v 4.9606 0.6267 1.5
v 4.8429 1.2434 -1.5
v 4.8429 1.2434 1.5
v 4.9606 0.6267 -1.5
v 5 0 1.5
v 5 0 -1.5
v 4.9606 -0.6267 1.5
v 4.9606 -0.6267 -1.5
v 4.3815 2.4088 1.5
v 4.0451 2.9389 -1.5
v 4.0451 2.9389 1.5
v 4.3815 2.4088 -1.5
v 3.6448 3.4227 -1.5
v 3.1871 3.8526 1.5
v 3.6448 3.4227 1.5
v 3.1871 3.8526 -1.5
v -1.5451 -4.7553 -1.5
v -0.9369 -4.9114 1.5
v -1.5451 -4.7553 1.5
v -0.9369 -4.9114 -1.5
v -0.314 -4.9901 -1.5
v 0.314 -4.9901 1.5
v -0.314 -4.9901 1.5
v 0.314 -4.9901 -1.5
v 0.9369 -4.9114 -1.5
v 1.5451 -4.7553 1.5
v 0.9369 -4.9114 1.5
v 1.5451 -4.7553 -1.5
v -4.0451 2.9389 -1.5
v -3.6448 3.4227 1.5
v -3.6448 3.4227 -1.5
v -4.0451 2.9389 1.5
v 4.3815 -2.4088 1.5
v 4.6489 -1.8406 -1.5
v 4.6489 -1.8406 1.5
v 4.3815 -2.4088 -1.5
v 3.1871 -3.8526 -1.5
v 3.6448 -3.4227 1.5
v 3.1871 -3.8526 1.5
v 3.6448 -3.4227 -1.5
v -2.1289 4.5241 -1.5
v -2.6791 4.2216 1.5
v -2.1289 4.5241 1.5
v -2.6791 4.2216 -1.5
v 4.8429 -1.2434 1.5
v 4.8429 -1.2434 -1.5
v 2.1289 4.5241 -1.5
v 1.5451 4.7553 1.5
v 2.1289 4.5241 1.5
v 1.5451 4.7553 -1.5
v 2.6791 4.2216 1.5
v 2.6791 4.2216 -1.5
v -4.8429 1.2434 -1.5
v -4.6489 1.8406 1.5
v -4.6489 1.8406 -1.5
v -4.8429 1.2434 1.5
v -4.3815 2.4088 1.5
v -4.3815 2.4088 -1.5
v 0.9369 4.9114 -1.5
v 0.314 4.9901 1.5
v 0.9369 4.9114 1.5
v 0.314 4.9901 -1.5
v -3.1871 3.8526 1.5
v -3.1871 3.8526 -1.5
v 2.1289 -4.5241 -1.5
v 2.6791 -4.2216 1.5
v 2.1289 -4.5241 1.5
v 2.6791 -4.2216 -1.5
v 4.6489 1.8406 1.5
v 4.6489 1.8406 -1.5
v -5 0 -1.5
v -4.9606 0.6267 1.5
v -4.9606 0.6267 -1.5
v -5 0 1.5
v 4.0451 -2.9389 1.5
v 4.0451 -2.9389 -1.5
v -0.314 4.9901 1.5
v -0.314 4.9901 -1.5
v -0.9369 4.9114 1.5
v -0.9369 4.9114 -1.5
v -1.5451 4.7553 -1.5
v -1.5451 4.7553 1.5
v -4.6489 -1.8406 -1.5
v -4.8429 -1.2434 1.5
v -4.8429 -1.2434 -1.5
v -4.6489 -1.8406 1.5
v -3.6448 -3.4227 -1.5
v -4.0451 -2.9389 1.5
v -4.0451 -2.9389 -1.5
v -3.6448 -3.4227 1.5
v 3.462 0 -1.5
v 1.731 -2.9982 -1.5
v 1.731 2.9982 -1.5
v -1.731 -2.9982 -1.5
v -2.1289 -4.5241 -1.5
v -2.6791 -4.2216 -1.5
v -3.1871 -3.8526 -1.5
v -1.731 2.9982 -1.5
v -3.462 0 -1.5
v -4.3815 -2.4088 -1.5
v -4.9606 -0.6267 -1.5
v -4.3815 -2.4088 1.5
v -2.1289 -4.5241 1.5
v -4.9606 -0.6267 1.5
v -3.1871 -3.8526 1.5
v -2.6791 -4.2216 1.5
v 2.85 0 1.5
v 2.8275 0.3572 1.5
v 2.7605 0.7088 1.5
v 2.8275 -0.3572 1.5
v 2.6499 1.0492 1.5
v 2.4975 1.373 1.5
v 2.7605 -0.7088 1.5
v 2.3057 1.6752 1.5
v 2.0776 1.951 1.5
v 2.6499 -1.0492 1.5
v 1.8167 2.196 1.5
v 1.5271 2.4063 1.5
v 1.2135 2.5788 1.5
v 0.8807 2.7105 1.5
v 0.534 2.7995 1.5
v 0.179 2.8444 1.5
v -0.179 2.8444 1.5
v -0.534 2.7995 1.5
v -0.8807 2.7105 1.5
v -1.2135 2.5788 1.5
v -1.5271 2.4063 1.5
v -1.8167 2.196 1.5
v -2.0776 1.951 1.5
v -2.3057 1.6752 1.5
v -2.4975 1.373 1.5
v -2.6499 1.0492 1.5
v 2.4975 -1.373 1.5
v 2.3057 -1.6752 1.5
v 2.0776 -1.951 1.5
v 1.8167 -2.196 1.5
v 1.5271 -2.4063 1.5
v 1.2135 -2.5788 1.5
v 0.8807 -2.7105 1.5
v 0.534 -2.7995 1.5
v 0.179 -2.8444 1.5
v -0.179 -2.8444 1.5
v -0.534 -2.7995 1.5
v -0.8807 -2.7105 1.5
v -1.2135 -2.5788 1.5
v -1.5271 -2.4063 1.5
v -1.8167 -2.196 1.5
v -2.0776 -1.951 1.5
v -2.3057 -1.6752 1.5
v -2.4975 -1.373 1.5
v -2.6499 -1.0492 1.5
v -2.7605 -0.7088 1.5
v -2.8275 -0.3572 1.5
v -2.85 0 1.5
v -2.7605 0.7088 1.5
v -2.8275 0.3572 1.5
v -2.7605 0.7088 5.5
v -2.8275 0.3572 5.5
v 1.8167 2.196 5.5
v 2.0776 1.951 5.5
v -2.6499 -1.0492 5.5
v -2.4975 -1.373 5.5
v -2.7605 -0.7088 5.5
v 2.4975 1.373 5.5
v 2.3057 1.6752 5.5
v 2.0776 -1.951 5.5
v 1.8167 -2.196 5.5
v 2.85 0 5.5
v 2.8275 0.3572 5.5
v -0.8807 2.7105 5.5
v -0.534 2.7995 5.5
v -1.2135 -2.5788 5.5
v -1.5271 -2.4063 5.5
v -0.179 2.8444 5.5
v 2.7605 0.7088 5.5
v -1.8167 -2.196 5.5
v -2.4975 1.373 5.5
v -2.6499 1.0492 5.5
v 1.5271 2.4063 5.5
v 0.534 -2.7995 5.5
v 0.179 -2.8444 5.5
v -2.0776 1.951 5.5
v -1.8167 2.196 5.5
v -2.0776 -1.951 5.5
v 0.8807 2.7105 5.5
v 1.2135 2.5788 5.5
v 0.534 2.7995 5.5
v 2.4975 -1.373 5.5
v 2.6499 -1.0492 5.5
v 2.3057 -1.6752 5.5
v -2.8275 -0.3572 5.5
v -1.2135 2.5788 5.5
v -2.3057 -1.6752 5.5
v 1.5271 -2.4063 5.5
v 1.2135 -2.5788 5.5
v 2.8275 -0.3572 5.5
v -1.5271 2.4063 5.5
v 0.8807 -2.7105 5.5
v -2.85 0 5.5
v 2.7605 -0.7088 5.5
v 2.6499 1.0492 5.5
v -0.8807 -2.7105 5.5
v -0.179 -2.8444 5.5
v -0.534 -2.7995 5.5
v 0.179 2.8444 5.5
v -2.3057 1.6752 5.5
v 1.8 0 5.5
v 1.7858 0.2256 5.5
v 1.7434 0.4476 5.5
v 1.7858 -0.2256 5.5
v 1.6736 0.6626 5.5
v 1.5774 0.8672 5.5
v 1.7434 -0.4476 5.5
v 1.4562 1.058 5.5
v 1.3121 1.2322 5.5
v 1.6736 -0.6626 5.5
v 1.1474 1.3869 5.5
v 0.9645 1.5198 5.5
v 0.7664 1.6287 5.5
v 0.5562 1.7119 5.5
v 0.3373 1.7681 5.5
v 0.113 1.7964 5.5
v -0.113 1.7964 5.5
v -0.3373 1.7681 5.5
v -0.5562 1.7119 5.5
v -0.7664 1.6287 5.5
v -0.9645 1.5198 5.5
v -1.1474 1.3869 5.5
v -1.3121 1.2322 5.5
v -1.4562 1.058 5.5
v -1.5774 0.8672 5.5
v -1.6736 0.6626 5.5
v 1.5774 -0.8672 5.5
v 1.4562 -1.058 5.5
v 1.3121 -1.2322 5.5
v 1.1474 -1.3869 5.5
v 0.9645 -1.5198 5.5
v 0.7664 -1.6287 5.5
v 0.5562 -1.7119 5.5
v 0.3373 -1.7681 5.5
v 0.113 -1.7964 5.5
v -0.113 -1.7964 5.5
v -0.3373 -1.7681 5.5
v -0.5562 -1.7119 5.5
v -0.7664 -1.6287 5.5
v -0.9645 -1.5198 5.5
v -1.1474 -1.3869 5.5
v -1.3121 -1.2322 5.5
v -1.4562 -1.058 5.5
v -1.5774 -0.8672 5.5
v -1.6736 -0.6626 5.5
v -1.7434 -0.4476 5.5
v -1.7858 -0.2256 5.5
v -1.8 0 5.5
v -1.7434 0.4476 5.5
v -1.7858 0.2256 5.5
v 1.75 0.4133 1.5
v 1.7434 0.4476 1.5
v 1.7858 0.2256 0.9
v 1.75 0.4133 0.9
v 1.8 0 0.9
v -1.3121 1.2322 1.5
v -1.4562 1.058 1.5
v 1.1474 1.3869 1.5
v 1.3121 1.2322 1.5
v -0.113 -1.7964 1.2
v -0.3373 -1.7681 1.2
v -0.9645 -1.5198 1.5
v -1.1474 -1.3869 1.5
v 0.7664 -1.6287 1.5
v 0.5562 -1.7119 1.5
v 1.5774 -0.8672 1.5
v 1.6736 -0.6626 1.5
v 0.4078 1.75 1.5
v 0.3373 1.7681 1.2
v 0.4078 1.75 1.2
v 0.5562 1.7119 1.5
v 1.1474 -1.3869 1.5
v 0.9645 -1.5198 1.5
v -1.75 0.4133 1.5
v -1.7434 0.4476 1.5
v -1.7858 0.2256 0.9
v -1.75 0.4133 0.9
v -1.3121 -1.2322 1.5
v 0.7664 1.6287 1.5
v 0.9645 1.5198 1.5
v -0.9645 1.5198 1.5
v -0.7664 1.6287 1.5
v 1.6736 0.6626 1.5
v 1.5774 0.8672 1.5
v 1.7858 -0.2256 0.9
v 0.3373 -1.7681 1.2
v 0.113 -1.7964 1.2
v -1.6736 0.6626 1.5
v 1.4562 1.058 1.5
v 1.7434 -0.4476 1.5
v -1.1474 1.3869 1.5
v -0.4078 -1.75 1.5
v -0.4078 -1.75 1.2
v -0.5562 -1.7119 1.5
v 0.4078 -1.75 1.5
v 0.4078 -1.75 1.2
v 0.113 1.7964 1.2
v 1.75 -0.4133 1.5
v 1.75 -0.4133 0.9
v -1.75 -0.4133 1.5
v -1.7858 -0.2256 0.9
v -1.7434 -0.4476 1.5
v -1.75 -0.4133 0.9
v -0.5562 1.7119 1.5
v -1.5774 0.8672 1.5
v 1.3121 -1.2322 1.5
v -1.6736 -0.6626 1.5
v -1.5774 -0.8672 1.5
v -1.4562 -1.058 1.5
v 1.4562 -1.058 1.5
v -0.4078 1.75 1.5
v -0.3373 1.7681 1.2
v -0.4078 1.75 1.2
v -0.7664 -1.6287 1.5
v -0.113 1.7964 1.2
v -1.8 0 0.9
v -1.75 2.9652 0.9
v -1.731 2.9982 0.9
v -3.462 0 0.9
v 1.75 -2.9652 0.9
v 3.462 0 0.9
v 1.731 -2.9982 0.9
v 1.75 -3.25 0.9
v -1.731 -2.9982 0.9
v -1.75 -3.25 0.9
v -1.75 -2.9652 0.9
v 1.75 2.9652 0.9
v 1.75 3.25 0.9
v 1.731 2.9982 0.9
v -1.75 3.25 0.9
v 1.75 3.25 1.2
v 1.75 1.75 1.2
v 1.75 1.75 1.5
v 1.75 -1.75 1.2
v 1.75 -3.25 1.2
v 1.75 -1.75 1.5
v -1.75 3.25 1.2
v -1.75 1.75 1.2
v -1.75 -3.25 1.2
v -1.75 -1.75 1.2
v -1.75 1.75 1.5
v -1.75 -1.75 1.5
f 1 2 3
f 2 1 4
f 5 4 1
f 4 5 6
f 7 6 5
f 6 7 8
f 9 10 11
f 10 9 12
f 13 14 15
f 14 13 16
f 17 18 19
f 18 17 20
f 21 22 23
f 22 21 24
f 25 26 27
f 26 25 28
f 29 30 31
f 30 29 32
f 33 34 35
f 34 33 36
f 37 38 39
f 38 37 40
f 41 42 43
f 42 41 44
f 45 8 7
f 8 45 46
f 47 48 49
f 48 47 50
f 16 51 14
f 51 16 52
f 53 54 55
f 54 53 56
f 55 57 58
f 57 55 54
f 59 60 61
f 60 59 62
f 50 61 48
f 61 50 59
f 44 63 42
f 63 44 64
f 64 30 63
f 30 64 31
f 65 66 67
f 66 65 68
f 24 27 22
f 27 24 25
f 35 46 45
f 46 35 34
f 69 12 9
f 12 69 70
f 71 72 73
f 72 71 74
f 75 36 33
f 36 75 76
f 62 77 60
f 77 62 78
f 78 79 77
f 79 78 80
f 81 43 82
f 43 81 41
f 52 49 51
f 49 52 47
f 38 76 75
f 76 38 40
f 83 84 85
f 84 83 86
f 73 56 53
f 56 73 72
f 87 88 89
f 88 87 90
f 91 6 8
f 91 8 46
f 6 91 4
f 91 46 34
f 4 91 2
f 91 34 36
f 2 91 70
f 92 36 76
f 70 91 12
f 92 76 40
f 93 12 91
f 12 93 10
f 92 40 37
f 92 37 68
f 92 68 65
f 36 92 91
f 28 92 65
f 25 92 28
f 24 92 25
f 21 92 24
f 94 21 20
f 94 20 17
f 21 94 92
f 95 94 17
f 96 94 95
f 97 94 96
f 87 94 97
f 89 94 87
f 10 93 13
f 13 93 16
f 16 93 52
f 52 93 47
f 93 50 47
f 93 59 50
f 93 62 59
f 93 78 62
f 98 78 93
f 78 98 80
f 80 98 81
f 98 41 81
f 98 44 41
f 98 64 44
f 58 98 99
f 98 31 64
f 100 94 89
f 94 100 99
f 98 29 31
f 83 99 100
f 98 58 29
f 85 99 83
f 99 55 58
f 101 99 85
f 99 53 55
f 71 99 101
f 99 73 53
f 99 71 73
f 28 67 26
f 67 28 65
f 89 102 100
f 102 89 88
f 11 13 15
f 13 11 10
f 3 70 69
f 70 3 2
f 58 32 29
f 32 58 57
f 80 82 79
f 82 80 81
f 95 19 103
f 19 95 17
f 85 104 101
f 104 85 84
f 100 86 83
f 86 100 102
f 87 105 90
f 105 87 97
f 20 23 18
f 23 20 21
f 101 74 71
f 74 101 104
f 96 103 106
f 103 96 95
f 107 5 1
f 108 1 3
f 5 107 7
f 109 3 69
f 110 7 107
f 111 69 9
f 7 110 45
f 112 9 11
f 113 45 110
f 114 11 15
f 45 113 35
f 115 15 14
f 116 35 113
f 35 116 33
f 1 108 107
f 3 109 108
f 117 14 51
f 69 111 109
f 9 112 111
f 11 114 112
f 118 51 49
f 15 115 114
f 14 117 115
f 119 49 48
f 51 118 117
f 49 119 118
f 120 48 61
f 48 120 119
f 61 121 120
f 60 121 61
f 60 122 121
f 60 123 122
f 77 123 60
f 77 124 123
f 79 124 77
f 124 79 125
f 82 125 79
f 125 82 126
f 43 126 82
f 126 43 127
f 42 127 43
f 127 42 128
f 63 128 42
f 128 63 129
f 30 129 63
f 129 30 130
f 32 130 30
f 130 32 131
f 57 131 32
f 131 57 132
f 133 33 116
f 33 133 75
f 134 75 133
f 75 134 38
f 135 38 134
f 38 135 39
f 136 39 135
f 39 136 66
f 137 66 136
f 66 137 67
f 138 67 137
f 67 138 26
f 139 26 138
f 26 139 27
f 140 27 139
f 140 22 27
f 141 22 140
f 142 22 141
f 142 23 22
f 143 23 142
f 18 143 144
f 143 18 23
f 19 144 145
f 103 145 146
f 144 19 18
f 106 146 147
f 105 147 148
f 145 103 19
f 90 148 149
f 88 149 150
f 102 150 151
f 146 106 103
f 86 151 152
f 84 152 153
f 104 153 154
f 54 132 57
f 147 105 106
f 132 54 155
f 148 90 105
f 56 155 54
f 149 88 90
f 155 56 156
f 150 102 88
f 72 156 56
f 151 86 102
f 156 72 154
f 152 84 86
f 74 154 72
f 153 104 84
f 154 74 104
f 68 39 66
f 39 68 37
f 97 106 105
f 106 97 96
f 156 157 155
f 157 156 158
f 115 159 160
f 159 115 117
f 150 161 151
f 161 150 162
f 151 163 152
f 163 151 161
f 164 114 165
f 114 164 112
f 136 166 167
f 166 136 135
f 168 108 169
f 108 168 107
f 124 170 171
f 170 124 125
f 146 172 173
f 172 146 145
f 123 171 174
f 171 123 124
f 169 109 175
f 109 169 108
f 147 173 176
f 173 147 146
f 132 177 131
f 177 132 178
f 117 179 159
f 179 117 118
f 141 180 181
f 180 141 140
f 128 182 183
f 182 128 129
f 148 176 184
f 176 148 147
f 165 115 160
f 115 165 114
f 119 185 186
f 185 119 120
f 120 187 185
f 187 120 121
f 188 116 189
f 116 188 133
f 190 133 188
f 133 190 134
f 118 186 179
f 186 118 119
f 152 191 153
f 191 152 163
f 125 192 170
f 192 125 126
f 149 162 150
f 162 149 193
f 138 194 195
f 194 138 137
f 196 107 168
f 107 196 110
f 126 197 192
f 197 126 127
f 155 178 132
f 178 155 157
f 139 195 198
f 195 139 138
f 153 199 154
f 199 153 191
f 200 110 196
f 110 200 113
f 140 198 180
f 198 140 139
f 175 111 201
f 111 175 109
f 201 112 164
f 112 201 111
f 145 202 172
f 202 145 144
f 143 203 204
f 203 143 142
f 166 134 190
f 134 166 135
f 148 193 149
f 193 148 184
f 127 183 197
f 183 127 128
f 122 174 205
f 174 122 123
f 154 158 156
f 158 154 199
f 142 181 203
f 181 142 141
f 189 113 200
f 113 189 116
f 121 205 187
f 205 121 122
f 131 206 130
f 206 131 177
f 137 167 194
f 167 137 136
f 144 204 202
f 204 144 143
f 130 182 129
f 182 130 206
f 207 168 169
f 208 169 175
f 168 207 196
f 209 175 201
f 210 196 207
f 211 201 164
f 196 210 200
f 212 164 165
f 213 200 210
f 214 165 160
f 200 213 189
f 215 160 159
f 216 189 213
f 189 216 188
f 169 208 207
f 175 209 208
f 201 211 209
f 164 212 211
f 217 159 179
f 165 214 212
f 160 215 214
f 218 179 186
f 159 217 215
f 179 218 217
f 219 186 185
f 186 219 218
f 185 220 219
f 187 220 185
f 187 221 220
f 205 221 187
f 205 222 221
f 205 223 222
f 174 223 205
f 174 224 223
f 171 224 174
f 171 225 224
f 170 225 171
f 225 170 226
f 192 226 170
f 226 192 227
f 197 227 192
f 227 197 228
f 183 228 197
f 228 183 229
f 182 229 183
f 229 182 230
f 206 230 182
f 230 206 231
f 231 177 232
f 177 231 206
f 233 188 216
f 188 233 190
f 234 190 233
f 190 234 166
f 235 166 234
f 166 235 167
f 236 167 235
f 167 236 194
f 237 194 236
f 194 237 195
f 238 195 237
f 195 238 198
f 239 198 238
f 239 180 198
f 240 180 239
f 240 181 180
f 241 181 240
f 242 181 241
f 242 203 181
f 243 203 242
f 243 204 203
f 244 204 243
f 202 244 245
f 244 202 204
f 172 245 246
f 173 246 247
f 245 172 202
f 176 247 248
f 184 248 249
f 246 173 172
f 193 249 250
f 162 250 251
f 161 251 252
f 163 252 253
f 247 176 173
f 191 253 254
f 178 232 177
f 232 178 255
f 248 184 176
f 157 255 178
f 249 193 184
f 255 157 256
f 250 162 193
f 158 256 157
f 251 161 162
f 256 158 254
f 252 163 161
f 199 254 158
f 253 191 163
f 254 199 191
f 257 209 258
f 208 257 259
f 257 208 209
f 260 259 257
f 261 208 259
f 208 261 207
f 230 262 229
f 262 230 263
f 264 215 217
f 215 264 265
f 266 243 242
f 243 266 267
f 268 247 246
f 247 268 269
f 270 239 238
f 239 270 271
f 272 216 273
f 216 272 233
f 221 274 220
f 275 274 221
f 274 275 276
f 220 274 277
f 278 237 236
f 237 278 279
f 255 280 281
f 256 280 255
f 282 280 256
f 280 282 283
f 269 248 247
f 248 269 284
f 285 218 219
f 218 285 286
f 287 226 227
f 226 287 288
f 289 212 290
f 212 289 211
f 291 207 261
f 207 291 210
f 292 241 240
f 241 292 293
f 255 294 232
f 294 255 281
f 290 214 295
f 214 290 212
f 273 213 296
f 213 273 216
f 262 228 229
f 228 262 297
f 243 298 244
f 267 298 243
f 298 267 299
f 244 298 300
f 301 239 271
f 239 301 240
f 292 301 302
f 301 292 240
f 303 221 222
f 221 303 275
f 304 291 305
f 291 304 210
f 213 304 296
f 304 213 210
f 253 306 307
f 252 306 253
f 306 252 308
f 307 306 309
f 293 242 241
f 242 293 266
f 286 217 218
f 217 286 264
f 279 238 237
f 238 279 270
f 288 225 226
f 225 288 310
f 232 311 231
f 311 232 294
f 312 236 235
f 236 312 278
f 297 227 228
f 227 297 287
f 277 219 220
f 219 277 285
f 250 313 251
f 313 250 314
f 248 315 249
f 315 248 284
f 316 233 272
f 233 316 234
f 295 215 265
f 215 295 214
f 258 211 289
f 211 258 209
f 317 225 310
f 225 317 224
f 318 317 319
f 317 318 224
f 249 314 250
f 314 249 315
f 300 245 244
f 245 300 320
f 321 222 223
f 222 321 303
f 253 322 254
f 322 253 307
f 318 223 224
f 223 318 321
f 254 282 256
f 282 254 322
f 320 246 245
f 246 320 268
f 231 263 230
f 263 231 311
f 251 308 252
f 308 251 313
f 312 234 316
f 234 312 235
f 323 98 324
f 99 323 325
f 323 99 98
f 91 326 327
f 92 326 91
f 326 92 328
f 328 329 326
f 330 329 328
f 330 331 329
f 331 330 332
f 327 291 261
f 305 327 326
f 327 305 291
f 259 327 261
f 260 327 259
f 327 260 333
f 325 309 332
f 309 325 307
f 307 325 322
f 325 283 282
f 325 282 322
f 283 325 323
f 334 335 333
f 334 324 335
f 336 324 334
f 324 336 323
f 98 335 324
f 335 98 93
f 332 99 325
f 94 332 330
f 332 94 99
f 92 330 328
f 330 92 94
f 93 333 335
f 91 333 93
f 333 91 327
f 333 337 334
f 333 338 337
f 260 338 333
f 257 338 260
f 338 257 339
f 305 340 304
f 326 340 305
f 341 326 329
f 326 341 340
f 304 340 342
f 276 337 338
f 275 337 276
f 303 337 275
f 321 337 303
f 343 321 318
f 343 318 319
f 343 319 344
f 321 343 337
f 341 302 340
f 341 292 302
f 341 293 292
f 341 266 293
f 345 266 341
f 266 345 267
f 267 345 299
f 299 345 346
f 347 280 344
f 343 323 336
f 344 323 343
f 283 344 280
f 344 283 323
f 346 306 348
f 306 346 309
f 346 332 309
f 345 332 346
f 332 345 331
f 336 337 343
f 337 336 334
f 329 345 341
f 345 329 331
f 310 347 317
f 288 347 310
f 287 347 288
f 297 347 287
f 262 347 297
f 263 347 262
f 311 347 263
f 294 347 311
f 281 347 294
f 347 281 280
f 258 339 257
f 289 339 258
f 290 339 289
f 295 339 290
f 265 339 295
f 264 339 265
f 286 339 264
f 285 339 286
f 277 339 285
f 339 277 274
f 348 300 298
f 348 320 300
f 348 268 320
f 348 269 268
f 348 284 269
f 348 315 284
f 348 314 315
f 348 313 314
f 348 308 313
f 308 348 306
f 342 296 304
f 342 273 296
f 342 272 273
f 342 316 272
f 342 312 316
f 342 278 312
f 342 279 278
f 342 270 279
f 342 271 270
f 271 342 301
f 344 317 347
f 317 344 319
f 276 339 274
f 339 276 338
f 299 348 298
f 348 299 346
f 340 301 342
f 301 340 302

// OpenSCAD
$fn = 50;


difference() {
	union() {
		translate(v = [0, 0, -1.5000000000]) {
			rotate(a = [0, 0, 0]) {
				cylinder(h = 3, r = 5.0000000000);
			}
		}
		translate(v = [0, 0, -1.5000000000]) {
			rotate(a = [0, 0, 0]) {
				cylinder(h = 7, r = 2.8500000000);
			}
		}
	}
	union() {
		translate(v = [0, 0, -125.0000000000]) {
			rotate(a = [0, 0, 0]) {
				cylinder(h = 250, r = 1.8000000000);
			}
		}
		translate(v = [0, 0, -2.1000000000]) {
			rotate(a = [0, 0, 0]) {
				#translate(v = [0, 0, 0]) {
					rotate(a = [0, 0, 0]) {
						linear_extrude(height = 3) {
							polygon(points = [[3.4620000000, 0.0000000000], [1.7310000000, 2.9981799479], [-1.7310000000, 2.9981799479], [-3.4620000000, 0.0000000000], [-1.7310000000, -2.9981799479], [1.7310000000, -2.9981799479]]);
						}
					}
				}
			}
		}
		#translate(v = [-1.7500000000, -3.2500000000, 0.9000000000]) {
			rotate(a = [0, 0, 0]) {
				cube(size = [3.5000000000, 6.5000000000, 0.3000000000]);
			}
		}
		#translate(v = [-1.7500000000, -1.7500000000, 1.2000000000]) {
			rotate(a = [0, 0, 0]) {
				cube(size = [3.5000000000, 3.5000000000, 0.3000000000]);
			}
		}
		#translate(v = [-1.7500000000, -3.2500000000, -2.4000000000]) {
			rotate(a = [0, 0, 0]) {
				cube(size = [3.5000000000, 6.5000000000, 0.3000000000]);
			}
		}
		#translate(v = [-1.7500000000, -1.7500000000, -2.7000000000]) {
			rotate(a = [0, 0, 0]) {
				cube(size = [3.5000000000, 3.5000000000, 0.3000000000]);
			}
		}
	}
}
